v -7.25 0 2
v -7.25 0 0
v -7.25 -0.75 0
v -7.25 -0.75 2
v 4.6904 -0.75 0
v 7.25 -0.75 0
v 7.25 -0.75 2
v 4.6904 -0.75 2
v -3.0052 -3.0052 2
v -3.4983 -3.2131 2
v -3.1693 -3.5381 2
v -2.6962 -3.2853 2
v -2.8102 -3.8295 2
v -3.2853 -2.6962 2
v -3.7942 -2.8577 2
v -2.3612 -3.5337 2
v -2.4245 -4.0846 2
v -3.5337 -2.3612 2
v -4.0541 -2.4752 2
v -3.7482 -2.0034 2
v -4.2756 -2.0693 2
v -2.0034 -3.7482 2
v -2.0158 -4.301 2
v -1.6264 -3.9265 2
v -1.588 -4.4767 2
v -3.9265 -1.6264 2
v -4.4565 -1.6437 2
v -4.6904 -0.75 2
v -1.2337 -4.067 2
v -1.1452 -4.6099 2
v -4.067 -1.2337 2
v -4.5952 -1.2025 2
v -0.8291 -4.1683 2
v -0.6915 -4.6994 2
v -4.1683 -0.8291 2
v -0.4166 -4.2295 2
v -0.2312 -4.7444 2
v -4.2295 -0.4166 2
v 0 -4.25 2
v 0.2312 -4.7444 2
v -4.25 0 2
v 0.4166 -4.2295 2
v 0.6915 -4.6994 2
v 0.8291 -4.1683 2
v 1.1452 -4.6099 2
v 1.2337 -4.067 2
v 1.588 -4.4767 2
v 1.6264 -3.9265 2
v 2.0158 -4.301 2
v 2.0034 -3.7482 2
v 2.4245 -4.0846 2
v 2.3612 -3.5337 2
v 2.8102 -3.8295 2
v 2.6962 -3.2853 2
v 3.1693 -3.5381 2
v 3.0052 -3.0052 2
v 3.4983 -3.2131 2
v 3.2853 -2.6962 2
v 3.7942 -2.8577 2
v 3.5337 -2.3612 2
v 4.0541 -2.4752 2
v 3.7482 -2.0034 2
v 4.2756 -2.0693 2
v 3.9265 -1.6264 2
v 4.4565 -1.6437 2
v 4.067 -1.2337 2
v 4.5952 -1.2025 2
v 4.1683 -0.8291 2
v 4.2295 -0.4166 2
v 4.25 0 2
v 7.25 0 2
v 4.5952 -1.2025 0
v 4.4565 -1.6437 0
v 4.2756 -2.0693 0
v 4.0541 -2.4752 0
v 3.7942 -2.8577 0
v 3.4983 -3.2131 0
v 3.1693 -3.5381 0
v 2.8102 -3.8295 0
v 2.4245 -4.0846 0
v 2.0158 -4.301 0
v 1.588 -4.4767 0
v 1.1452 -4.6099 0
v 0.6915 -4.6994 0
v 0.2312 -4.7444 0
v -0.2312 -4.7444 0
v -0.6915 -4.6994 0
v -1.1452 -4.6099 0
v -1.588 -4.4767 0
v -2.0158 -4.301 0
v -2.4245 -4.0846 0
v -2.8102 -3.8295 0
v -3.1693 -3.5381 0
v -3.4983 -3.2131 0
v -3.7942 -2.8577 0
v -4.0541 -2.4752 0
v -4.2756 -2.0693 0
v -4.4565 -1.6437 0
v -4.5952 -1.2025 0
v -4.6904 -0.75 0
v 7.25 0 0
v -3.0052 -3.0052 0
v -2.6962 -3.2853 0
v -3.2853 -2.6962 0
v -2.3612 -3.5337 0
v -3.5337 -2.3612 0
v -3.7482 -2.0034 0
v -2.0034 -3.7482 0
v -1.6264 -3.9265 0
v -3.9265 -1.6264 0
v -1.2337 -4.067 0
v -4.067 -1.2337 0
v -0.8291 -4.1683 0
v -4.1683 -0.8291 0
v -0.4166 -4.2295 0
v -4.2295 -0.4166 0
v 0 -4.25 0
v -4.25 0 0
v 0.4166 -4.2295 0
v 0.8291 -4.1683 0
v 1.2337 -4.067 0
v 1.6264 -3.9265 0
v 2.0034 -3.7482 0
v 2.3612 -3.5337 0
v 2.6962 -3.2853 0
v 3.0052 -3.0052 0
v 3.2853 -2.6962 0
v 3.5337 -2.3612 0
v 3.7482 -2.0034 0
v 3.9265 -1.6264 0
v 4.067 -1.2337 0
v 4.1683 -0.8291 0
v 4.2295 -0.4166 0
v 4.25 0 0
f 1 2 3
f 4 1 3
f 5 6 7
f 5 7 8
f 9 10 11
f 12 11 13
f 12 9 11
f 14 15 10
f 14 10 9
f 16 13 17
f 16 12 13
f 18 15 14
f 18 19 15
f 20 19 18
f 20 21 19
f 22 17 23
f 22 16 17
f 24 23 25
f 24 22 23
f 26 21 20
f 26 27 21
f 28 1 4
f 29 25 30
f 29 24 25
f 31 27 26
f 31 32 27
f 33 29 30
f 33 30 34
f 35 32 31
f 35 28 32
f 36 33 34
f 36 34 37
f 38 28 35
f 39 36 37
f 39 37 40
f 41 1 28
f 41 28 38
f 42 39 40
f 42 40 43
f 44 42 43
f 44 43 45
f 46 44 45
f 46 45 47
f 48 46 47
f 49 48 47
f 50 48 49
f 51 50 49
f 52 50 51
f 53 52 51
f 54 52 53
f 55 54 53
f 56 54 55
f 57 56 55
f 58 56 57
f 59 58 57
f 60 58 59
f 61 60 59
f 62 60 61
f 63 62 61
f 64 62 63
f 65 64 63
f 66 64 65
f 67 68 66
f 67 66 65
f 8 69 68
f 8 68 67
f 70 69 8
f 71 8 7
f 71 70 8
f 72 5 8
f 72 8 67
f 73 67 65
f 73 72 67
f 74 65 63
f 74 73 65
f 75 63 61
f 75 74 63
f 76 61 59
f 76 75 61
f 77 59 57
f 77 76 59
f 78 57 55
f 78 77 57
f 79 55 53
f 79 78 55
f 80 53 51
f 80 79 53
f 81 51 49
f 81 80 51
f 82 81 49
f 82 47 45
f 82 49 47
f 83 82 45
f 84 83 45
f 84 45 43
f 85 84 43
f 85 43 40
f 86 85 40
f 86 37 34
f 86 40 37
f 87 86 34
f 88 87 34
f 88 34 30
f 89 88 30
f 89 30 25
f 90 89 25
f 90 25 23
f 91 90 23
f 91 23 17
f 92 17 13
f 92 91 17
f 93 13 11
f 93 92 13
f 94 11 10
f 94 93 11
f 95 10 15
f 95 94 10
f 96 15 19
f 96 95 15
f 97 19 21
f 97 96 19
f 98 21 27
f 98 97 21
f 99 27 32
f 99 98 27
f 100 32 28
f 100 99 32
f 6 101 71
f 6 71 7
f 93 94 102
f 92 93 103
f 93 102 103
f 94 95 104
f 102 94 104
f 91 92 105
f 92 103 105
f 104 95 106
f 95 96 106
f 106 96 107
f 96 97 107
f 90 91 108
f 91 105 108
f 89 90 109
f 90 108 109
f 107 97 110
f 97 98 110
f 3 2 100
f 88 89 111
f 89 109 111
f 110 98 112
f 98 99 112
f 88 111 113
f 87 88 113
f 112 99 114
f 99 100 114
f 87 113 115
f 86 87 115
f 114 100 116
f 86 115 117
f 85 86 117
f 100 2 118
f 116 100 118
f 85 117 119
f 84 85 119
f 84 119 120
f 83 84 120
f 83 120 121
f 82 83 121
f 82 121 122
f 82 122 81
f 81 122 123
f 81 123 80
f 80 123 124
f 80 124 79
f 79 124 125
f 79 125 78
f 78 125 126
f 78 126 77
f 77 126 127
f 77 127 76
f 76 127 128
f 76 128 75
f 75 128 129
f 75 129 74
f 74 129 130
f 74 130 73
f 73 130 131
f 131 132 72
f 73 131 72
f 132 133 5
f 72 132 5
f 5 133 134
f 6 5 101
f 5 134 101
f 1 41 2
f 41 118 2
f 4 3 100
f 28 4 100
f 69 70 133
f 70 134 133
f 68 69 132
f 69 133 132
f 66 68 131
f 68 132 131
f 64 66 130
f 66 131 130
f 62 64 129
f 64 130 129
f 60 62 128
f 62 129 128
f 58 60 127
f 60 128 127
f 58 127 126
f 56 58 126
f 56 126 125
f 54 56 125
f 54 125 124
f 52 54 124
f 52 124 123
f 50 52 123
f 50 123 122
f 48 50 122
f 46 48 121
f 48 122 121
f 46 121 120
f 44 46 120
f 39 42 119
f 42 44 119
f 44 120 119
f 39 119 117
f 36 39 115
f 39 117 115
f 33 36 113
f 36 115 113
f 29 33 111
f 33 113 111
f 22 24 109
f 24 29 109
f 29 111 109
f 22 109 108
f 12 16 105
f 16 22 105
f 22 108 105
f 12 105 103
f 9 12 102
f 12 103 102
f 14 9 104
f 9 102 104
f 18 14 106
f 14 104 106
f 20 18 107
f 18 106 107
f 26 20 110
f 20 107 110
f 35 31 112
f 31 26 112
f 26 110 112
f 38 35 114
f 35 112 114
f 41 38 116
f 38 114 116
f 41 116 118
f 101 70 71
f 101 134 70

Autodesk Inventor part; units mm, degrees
ref_plane "YZ Plane" through (0, 0, 0) normal (1, 0, 0) x (0, 1, 0)
ref_plane "XZ Plane" through (0, 0, 0) normal (0, 1, 0) x (-1, 0, 0)
ref_plane "XY Plane" through (0, 0, 0) normal (0, 0, 1) x (1, 0, 0)
sketch "Sketch2" plane through (0, 0, 0) normal (0, 0, 1) x (1, 0, 0)
  arc A0 (-4.25, 0) -> (4.25, 0) centre (0, 0) ccw
  line L0 (4.25, 0) -> (7.25, 0)
  line L1 (-4.25, 0) -> (-7.25, 0)
  arc A1 (-4.6904, -0.75) -> (4.6904, -0.75) centre (0, 0) ccw
  line L2 (-7.25, 0) -> (-7.25, -0.75)
  line L3 (-7.25, -0.75) -> (-4.6904, -0.75)
  line L4 (7.25, 0) -> (7.25, -0.75)
  line L5 (7.25, -0.75) -> (4.6904, -0.75)
  dimension "d8" = 8.5
  dimension "d9" = 3
  dimension "d10" = 3
  dimension "d11" = 9.5
  dimension "d12" = 0.75
extrude "Extrusion2" add sketch "Sketch2" along normal blind 2
